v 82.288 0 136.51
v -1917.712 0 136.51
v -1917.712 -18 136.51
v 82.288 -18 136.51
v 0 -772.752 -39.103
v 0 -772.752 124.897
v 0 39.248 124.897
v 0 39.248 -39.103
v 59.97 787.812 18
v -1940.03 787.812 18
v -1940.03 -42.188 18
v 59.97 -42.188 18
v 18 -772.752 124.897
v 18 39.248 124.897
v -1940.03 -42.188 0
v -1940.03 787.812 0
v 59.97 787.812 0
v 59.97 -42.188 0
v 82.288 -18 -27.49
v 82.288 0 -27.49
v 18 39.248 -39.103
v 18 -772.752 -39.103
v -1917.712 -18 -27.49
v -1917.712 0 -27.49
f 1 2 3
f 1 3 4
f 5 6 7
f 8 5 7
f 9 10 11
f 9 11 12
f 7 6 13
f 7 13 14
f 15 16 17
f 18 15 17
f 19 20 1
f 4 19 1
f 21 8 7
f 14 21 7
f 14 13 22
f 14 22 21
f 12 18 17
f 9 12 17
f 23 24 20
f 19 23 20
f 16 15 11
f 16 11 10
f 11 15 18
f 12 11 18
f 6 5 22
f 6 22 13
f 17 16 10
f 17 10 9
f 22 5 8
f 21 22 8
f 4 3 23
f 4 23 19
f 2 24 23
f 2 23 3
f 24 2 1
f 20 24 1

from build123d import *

# Parameters (mm, degrees)
F0_W     = 2000
F0_H     = 830
F1_DEPTH = 18
F2_W     = 2000
F2_H     = 164
F3_DEPTH = 18
F4_W     = 812
F4_H     = 164
F5_DEPTH = 18


with BuildPart() as f1:
    # F0 (on Top) → F1 (new body)
    with BuildSketch(Plane.XY):
        with Locations((-940.03024, 372.812499)):
            Rectangle(F0_W, F0_H)
    extrude(amount=F1_DEPTH)


with BuildPart() as f3:
    # F2 (on Front) → F3 (new body)
    with BuildSketch(Plane.XZ):
        with Locations((-917.71169, 54.510081)):
            Rectangle(F2_W, F2_H)
    extrude(amount=F3_DEPTH)


with BuildPart() as f5:
    # F4 (on Right) → F5 (new body)
    with BuildSketch(Plane.YZ):
        with Locations((-366.752011, 42.897177)):
            Rectangle(F4_W, F4_H)
    extrude(amount=F5_DEPTH)


solid = Compound([f1.part, f3.part, f5.part])
